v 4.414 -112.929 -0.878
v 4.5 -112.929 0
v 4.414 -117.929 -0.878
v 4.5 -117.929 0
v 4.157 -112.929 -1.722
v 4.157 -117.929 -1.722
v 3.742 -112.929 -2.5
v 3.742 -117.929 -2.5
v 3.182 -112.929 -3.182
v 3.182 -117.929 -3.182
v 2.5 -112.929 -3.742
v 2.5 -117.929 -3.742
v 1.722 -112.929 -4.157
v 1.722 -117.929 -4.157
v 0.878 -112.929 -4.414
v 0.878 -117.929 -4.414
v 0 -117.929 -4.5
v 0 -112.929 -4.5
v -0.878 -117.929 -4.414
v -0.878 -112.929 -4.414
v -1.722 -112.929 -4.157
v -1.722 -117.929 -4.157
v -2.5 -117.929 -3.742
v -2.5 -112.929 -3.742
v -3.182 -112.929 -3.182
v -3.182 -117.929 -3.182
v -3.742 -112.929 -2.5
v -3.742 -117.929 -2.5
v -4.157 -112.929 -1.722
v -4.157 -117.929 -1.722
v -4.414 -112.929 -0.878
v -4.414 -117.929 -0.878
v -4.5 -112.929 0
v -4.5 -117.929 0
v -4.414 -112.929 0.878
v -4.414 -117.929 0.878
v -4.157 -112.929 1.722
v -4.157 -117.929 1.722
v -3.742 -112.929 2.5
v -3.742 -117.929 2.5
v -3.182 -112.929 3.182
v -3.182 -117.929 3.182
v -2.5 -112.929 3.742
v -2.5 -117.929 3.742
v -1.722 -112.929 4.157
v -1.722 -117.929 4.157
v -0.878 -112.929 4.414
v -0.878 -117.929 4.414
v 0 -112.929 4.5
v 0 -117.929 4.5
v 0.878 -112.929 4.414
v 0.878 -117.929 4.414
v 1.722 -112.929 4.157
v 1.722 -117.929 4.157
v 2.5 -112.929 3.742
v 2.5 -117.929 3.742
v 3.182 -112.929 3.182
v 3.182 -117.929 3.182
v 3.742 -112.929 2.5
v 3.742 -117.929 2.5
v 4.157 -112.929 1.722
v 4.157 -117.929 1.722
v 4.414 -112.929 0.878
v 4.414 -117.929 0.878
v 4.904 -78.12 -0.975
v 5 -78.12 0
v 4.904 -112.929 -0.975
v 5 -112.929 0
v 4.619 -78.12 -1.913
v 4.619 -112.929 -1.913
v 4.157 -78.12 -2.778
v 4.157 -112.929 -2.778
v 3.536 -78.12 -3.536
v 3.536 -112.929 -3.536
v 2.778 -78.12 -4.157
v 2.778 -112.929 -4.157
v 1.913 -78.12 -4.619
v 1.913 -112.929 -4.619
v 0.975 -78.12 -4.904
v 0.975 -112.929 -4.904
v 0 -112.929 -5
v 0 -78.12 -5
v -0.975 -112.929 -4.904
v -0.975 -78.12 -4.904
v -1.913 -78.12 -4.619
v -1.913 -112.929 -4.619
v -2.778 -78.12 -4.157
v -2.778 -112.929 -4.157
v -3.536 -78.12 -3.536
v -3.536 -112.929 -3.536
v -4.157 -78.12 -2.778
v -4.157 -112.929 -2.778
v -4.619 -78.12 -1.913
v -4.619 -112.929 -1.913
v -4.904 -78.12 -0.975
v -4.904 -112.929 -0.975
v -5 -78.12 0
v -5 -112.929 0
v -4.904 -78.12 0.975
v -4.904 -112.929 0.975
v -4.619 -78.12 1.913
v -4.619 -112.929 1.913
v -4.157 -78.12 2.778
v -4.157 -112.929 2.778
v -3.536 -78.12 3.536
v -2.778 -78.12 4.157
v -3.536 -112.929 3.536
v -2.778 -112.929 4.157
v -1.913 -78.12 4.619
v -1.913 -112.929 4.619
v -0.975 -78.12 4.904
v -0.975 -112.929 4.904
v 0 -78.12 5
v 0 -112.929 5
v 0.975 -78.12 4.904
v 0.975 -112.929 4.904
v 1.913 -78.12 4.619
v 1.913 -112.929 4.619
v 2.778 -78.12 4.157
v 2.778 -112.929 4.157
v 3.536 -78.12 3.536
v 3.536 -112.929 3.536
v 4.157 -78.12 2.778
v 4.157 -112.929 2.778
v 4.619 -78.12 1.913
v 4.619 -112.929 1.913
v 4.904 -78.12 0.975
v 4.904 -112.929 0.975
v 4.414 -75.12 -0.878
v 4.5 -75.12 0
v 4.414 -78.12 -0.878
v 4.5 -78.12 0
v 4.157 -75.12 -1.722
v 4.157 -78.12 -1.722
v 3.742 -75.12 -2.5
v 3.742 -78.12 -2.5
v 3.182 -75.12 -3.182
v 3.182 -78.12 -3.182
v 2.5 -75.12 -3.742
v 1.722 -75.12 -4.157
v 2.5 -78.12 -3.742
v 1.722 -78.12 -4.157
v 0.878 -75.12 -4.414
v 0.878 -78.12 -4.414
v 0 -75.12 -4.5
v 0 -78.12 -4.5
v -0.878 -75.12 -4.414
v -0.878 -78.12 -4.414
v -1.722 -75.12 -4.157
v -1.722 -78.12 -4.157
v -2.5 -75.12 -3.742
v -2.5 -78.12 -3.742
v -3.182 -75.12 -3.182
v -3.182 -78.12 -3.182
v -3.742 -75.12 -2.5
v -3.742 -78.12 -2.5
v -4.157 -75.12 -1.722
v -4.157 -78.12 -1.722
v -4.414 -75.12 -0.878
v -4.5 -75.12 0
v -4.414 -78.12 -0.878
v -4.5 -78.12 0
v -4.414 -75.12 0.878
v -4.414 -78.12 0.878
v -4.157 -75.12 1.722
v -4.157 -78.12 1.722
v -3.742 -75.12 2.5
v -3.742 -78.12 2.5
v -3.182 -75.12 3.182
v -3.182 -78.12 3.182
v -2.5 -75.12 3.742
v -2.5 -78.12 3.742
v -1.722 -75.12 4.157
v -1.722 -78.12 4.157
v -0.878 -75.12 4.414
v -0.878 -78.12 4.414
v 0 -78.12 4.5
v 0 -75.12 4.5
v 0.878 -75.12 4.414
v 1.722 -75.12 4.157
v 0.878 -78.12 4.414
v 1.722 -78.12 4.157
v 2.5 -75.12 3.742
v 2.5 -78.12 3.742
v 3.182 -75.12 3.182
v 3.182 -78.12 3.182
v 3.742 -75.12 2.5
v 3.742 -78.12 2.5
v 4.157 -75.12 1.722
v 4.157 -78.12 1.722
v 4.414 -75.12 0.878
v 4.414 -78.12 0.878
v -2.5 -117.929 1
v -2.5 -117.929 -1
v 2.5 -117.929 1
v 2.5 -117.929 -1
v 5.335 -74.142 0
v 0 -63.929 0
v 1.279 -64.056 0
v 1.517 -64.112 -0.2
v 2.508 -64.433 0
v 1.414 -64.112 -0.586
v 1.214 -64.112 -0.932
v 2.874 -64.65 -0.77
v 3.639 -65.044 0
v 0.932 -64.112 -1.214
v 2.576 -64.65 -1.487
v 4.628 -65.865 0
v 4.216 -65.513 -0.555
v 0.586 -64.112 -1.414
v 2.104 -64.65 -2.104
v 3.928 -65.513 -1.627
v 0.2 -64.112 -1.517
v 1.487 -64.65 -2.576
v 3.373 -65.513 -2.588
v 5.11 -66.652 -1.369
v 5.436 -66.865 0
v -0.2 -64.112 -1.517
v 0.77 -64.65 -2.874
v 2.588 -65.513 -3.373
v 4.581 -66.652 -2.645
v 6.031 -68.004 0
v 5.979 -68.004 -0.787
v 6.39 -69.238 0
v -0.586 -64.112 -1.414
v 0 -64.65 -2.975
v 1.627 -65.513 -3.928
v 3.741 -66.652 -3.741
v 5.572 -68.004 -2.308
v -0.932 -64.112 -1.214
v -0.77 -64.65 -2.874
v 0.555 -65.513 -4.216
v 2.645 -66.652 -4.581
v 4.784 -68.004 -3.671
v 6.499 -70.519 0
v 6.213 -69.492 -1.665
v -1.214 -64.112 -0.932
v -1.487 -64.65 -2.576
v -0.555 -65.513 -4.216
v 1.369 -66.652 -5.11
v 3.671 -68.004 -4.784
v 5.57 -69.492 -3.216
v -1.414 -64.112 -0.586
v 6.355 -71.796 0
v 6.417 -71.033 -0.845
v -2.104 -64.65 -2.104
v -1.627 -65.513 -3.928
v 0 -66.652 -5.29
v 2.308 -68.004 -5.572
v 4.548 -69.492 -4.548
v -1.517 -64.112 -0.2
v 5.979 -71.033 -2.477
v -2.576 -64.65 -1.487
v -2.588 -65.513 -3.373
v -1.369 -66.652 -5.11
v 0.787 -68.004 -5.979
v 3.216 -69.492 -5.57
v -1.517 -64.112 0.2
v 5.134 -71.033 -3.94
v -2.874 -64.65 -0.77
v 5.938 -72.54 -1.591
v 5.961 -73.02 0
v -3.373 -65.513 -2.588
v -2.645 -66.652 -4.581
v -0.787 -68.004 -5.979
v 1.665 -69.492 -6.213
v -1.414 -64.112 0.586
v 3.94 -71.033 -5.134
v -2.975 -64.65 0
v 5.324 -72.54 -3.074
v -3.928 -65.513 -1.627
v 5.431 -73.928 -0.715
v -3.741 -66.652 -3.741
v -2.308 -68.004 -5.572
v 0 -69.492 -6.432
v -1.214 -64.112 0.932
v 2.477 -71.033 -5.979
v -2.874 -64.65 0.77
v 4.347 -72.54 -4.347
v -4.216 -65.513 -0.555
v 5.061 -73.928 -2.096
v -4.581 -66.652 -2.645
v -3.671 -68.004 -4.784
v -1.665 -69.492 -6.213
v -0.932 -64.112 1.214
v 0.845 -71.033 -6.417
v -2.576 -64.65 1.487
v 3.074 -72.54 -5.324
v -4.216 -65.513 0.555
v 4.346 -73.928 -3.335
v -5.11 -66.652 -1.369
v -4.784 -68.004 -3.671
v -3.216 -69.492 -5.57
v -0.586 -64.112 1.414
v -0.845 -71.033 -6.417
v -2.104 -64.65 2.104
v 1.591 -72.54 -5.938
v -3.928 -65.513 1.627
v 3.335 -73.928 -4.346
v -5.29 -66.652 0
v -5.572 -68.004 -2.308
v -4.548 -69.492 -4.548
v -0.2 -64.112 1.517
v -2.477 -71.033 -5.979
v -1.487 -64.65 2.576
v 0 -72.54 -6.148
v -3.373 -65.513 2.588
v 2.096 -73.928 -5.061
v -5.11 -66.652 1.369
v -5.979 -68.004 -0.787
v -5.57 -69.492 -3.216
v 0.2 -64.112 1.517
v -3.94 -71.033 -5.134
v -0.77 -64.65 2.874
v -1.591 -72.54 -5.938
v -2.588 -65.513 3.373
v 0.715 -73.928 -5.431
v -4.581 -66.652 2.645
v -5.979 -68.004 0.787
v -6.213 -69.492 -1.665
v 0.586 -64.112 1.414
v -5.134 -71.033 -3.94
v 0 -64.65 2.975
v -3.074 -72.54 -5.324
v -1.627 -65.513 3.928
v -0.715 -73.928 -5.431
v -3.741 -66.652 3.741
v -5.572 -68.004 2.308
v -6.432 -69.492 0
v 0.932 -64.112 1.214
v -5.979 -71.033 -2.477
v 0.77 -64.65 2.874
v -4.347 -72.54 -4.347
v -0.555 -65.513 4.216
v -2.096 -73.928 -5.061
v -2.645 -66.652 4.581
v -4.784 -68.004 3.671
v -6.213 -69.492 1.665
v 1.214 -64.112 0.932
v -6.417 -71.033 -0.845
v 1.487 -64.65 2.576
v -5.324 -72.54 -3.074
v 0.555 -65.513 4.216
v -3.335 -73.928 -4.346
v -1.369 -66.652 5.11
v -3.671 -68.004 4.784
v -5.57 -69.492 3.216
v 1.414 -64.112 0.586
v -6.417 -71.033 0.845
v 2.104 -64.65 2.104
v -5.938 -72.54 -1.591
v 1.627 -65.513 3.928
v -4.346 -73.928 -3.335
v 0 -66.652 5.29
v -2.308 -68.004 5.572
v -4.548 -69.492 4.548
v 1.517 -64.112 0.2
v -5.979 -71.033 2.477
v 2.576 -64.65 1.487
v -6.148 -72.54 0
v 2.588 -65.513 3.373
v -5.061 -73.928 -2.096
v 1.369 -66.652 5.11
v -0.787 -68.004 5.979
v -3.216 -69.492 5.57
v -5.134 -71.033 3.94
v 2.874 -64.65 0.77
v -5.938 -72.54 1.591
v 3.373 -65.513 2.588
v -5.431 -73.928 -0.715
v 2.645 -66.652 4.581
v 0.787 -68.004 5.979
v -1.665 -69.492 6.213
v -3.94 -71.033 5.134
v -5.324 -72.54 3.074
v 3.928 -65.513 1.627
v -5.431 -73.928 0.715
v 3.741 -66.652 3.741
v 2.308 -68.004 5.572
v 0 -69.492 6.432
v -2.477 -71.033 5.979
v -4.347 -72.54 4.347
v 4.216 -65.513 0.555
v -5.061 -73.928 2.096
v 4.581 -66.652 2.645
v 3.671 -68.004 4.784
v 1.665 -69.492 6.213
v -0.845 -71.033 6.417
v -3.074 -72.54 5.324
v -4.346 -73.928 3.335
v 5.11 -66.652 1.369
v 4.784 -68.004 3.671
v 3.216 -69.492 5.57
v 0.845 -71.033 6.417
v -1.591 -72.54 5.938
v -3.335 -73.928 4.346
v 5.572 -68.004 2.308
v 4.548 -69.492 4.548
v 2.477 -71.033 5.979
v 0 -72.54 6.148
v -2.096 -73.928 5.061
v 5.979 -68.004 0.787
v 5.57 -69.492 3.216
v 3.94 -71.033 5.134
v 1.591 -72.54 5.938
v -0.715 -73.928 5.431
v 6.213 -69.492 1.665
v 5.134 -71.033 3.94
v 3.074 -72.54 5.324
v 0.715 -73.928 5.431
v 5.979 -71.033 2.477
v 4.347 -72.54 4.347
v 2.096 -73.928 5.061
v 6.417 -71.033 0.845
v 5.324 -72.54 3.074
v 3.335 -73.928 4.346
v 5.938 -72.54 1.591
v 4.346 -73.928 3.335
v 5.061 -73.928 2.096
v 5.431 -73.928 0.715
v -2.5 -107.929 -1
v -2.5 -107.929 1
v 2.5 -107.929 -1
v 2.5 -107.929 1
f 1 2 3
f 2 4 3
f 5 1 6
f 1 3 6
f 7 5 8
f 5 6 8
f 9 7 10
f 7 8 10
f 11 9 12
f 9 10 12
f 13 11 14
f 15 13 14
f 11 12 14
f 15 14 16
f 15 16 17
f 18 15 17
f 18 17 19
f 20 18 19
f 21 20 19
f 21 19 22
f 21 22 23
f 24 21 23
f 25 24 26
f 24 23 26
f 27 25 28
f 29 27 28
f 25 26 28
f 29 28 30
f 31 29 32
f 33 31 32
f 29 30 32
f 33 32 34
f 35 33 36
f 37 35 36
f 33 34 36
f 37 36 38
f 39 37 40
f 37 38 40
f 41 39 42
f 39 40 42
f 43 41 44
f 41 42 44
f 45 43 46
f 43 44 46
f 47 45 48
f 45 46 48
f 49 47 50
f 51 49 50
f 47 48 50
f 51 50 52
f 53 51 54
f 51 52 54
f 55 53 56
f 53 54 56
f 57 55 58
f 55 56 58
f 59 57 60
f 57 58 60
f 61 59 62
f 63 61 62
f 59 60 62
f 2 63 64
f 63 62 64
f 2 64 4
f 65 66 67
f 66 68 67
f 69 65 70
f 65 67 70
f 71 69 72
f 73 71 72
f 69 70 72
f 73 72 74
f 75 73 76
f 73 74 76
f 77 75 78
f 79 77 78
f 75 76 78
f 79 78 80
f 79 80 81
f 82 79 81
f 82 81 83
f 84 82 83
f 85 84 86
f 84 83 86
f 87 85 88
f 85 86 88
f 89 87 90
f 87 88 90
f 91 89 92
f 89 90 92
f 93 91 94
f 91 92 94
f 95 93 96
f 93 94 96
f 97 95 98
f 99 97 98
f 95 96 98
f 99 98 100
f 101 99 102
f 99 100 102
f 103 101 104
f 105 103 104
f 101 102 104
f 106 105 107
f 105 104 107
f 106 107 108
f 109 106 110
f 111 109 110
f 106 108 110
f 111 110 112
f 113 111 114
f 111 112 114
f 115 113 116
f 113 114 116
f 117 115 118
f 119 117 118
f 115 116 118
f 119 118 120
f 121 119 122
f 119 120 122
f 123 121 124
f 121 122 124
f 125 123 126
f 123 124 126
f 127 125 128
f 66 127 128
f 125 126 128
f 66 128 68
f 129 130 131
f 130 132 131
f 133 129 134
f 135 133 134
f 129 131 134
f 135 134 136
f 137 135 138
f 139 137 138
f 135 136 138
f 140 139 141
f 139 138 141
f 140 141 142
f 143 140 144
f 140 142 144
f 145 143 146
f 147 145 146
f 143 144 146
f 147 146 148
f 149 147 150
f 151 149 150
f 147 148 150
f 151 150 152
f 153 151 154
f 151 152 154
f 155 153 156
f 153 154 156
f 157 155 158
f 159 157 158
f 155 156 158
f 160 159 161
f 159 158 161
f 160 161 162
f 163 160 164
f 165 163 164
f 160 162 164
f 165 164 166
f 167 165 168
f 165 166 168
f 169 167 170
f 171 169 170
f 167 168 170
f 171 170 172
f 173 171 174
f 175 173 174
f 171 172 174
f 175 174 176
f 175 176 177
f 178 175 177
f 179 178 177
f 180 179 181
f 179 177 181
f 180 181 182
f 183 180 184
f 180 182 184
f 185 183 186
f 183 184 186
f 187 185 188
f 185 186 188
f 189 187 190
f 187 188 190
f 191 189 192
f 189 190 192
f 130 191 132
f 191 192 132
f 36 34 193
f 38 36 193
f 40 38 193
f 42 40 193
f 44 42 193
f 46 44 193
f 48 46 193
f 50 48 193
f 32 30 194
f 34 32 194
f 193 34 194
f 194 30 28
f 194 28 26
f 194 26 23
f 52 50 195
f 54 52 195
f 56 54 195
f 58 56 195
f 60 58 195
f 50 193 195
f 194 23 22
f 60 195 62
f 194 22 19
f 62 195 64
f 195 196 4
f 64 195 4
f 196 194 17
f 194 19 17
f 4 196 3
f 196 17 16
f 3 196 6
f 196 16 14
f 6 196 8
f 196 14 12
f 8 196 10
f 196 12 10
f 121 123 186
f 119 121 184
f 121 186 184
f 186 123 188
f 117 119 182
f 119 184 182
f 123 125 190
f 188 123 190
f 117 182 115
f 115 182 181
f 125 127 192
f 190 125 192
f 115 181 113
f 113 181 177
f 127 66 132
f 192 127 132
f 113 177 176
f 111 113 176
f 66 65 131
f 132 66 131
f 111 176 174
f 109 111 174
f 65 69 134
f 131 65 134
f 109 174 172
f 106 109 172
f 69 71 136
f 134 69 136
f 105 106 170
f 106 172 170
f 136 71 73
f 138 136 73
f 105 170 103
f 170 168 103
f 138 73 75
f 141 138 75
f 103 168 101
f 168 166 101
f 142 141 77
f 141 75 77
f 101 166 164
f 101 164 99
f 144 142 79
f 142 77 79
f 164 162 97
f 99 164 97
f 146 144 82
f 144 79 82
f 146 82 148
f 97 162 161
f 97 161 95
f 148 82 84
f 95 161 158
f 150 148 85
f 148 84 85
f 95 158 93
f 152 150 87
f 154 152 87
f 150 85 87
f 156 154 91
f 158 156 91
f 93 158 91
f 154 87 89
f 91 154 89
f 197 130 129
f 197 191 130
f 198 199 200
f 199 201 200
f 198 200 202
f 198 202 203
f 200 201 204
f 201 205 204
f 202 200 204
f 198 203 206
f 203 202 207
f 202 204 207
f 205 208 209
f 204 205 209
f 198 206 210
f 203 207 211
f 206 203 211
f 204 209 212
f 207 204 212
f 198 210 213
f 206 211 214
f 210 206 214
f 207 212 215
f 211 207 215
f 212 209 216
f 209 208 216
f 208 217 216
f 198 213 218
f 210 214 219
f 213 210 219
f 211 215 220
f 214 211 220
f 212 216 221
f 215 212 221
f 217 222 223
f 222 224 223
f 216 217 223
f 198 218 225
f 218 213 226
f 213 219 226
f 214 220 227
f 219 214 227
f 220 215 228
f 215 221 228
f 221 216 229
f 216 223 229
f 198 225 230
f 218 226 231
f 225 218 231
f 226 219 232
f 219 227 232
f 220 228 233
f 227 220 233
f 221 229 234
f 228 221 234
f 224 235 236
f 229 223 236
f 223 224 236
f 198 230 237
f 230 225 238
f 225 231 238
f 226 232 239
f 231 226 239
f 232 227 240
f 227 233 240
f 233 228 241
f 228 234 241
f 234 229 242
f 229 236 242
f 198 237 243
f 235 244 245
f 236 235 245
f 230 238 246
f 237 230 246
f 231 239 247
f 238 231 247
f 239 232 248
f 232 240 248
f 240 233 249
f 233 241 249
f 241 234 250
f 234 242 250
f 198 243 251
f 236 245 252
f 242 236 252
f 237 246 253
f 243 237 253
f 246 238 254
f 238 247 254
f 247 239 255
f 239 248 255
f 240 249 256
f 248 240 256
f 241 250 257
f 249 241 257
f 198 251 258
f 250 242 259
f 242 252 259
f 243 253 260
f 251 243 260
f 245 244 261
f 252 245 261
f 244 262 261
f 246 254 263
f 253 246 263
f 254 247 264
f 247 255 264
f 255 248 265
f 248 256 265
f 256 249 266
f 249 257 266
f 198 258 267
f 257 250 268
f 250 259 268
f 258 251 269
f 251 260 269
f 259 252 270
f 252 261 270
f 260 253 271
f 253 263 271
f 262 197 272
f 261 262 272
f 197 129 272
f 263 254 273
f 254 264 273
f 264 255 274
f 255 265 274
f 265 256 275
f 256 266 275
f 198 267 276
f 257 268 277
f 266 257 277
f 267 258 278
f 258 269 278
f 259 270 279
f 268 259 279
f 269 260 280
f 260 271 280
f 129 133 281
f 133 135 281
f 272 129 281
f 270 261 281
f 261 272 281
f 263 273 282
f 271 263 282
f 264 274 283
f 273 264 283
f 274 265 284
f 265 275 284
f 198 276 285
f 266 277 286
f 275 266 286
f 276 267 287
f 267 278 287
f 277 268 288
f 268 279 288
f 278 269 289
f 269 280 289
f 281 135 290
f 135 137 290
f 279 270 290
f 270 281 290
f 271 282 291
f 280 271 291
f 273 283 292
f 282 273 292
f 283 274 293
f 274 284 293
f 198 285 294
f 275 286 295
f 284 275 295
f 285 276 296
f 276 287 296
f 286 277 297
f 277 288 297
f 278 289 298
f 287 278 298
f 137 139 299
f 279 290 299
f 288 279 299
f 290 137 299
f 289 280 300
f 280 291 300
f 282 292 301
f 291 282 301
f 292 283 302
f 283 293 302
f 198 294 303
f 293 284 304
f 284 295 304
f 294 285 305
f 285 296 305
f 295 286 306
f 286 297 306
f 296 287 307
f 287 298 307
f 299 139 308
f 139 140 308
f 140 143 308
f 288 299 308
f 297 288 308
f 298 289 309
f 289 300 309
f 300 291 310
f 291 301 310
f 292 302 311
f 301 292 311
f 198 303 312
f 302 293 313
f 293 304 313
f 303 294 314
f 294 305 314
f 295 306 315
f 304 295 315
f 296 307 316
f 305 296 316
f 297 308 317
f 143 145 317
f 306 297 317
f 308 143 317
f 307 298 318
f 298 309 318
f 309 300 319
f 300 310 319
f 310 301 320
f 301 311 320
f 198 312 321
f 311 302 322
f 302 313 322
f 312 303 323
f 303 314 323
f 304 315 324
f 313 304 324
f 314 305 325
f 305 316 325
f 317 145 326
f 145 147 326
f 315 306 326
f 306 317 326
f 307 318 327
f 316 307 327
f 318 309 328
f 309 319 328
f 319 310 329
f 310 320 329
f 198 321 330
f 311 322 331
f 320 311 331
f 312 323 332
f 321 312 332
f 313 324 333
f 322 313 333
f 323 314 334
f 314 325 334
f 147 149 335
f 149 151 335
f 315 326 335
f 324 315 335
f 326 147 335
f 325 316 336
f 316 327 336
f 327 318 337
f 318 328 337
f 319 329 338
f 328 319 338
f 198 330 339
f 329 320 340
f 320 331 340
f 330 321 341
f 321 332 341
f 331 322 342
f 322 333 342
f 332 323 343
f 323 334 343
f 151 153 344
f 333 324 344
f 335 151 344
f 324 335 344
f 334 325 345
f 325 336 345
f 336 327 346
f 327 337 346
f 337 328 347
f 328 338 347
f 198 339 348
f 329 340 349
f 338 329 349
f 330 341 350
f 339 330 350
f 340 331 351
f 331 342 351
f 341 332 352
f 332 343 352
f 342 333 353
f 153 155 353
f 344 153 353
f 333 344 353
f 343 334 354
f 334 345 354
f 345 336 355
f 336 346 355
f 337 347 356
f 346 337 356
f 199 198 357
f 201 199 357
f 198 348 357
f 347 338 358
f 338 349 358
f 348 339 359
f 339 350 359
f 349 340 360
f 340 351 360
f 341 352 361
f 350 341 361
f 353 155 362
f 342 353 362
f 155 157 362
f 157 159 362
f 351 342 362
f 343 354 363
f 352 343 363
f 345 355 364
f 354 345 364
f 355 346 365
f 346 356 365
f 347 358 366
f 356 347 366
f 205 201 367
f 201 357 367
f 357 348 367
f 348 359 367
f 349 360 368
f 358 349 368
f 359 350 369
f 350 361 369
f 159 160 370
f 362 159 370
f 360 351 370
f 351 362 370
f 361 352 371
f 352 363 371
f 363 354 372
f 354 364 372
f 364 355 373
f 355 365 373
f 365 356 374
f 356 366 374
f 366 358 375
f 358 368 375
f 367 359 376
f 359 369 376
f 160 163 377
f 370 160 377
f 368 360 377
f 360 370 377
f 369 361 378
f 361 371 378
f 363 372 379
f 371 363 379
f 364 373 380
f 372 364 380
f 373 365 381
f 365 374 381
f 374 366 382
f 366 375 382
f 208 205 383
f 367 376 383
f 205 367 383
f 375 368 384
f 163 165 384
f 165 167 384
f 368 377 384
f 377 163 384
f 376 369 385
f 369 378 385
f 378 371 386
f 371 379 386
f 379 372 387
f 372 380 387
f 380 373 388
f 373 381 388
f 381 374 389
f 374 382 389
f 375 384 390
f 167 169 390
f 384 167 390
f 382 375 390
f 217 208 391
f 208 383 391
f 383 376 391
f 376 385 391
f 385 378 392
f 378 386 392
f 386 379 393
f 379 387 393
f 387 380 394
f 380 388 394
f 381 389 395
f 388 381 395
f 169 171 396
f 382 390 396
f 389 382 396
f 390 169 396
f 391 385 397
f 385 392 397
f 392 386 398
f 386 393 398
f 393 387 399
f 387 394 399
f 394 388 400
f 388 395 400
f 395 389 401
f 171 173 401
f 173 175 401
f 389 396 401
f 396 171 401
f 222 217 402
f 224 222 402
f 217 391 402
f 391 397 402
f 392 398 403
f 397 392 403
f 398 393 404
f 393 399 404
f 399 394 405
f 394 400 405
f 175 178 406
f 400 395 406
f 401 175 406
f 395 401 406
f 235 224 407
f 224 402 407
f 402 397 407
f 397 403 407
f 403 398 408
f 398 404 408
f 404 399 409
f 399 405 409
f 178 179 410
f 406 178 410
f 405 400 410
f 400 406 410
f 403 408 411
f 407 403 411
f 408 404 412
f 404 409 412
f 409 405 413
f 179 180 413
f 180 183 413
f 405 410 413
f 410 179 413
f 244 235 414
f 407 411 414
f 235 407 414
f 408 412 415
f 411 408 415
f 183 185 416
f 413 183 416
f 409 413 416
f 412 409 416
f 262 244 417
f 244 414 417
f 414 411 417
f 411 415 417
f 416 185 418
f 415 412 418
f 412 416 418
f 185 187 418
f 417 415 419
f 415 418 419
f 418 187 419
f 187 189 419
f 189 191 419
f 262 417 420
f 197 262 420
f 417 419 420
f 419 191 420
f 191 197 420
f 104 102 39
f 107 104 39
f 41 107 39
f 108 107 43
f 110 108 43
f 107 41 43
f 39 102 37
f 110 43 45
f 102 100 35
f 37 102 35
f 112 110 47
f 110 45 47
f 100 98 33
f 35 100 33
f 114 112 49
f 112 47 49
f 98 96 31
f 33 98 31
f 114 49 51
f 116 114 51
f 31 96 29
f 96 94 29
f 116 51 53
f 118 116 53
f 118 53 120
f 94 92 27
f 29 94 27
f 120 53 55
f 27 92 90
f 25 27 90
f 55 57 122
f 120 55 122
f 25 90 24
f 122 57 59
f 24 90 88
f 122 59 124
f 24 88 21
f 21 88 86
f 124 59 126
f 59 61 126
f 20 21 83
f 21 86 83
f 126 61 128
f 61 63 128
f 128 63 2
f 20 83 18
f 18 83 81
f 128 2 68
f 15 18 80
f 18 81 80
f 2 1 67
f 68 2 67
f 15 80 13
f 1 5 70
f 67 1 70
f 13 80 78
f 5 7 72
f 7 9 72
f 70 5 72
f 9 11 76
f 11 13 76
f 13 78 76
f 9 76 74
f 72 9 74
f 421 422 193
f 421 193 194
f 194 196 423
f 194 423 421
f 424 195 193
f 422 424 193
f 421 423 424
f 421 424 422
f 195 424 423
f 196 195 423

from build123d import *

# Parameters (mm, degrees)
SKETCH2_W          = 5
SKETCH2_H          = 2
CUT_EXTRUDE1_DEPTH = 10


with BuildPart() as part:
    # Sketch1 → Revolve1 (revolve)
    with BuildSketch(Plane.XY):
        with BuildLine():
            Line((4.5, -75.119728996), (4.5, -78.119728996))
            Line((4.5, -78.119728996), (5, -78.119728996))
            Line((5, -78.119728996), (5, -112.929313237))
            Line((5, -112.929313237), (4.5, -112.929313237))
            Line((4.5, -112.929313237), (4.5, -117.929313237))
            Line((4.5, -117.929313237), (0, -117.929313237))
            Line((0, -117.929313237), (0, -63.929313237))
            ThreePointArc((0, -63.929313237), (6.030659269, -68.004205243), (4.5, -75.119728996))
        make_face()
    revolve(axis=Axis((0, -29.874534884, 0), (0, 1, 0)))

    # Sketch2 → Cut-Extrude1 (cut)
    with BuildSketch(Plane(origin=(0, -117.929313237, 0), x_dir=(-1, 0, 0), z_dir=(0, -1, 0))):
        Rectangle(SKETCH2_W, SKETCH2_H)
    extrude(amount=-CUT_EXTRUDE1_DEPTH, mode=Mode.SUBTRACT)


solid = part.part
